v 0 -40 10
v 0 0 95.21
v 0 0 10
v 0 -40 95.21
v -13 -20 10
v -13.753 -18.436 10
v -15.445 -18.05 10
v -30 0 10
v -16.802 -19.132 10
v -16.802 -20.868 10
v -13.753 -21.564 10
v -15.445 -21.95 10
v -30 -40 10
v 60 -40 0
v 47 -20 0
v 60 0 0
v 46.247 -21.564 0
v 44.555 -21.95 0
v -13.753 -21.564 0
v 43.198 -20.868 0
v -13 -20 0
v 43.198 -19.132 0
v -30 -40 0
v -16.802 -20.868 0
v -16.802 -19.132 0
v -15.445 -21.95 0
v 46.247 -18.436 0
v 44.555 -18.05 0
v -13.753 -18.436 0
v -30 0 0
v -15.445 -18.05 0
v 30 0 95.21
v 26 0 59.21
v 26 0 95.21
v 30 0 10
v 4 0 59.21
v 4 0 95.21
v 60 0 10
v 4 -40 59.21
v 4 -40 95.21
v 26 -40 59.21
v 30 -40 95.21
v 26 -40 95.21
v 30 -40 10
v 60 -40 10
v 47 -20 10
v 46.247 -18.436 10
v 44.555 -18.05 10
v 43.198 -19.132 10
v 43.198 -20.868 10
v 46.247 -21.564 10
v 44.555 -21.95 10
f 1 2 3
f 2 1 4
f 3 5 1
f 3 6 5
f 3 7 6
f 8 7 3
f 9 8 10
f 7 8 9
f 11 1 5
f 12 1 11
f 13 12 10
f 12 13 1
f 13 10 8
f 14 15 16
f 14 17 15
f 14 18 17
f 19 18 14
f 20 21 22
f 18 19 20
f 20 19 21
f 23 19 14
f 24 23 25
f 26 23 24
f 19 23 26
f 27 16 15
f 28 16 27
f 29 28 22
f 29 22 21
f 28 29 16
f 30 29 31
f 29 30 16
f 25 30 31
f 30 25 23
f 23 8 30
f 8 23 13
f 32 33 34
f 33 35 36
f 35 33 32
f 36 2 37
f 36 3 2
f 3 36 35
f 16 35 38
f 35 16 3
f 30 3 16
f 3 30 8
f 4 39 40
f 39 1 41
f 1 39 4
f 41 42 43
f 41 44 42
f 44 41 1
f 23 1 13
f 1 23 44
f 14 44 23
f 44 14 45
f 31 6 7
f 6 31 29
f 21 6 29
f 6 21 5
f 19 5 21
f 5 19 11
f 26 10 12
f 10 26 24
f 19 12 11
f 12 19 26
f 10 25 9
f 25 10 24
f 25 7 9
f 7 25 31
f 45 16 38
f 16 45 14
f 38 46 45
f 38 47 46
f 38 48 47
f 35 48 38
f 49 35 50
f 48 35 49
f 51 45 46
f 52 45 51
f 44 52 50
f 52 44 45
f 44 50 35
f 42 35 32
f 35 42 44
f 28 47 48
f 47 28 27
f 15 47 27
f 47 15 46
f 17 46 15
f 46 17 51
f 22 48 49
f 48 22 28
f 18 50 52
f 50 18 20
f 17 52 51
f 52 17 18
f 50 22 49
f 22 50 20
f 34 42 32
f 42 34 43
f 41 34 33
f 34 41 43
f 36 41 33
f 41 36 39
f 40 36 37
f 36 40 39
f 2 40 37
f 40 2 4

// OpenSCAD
// file: fixation.scad
module fixation() {
    difference(){
        translate([-30,-40,0])
            cube([30,40,10]);
        translate([-15,-20,-1])
            cylinder(20,2,2);
        
    }
    difference(){
        translate([30,-40,0])
            cube([30,40,10]);
        translate([45,-20,-1])
            cylinder(20,2,2);
    }
   
}
// main file
include <fixation.scad>

rotate([90,0,0])
    linear_extrude (height=40, $fn = 200)
        import (file="clips.dxf", layer="2", $fn=200);

fixation();
